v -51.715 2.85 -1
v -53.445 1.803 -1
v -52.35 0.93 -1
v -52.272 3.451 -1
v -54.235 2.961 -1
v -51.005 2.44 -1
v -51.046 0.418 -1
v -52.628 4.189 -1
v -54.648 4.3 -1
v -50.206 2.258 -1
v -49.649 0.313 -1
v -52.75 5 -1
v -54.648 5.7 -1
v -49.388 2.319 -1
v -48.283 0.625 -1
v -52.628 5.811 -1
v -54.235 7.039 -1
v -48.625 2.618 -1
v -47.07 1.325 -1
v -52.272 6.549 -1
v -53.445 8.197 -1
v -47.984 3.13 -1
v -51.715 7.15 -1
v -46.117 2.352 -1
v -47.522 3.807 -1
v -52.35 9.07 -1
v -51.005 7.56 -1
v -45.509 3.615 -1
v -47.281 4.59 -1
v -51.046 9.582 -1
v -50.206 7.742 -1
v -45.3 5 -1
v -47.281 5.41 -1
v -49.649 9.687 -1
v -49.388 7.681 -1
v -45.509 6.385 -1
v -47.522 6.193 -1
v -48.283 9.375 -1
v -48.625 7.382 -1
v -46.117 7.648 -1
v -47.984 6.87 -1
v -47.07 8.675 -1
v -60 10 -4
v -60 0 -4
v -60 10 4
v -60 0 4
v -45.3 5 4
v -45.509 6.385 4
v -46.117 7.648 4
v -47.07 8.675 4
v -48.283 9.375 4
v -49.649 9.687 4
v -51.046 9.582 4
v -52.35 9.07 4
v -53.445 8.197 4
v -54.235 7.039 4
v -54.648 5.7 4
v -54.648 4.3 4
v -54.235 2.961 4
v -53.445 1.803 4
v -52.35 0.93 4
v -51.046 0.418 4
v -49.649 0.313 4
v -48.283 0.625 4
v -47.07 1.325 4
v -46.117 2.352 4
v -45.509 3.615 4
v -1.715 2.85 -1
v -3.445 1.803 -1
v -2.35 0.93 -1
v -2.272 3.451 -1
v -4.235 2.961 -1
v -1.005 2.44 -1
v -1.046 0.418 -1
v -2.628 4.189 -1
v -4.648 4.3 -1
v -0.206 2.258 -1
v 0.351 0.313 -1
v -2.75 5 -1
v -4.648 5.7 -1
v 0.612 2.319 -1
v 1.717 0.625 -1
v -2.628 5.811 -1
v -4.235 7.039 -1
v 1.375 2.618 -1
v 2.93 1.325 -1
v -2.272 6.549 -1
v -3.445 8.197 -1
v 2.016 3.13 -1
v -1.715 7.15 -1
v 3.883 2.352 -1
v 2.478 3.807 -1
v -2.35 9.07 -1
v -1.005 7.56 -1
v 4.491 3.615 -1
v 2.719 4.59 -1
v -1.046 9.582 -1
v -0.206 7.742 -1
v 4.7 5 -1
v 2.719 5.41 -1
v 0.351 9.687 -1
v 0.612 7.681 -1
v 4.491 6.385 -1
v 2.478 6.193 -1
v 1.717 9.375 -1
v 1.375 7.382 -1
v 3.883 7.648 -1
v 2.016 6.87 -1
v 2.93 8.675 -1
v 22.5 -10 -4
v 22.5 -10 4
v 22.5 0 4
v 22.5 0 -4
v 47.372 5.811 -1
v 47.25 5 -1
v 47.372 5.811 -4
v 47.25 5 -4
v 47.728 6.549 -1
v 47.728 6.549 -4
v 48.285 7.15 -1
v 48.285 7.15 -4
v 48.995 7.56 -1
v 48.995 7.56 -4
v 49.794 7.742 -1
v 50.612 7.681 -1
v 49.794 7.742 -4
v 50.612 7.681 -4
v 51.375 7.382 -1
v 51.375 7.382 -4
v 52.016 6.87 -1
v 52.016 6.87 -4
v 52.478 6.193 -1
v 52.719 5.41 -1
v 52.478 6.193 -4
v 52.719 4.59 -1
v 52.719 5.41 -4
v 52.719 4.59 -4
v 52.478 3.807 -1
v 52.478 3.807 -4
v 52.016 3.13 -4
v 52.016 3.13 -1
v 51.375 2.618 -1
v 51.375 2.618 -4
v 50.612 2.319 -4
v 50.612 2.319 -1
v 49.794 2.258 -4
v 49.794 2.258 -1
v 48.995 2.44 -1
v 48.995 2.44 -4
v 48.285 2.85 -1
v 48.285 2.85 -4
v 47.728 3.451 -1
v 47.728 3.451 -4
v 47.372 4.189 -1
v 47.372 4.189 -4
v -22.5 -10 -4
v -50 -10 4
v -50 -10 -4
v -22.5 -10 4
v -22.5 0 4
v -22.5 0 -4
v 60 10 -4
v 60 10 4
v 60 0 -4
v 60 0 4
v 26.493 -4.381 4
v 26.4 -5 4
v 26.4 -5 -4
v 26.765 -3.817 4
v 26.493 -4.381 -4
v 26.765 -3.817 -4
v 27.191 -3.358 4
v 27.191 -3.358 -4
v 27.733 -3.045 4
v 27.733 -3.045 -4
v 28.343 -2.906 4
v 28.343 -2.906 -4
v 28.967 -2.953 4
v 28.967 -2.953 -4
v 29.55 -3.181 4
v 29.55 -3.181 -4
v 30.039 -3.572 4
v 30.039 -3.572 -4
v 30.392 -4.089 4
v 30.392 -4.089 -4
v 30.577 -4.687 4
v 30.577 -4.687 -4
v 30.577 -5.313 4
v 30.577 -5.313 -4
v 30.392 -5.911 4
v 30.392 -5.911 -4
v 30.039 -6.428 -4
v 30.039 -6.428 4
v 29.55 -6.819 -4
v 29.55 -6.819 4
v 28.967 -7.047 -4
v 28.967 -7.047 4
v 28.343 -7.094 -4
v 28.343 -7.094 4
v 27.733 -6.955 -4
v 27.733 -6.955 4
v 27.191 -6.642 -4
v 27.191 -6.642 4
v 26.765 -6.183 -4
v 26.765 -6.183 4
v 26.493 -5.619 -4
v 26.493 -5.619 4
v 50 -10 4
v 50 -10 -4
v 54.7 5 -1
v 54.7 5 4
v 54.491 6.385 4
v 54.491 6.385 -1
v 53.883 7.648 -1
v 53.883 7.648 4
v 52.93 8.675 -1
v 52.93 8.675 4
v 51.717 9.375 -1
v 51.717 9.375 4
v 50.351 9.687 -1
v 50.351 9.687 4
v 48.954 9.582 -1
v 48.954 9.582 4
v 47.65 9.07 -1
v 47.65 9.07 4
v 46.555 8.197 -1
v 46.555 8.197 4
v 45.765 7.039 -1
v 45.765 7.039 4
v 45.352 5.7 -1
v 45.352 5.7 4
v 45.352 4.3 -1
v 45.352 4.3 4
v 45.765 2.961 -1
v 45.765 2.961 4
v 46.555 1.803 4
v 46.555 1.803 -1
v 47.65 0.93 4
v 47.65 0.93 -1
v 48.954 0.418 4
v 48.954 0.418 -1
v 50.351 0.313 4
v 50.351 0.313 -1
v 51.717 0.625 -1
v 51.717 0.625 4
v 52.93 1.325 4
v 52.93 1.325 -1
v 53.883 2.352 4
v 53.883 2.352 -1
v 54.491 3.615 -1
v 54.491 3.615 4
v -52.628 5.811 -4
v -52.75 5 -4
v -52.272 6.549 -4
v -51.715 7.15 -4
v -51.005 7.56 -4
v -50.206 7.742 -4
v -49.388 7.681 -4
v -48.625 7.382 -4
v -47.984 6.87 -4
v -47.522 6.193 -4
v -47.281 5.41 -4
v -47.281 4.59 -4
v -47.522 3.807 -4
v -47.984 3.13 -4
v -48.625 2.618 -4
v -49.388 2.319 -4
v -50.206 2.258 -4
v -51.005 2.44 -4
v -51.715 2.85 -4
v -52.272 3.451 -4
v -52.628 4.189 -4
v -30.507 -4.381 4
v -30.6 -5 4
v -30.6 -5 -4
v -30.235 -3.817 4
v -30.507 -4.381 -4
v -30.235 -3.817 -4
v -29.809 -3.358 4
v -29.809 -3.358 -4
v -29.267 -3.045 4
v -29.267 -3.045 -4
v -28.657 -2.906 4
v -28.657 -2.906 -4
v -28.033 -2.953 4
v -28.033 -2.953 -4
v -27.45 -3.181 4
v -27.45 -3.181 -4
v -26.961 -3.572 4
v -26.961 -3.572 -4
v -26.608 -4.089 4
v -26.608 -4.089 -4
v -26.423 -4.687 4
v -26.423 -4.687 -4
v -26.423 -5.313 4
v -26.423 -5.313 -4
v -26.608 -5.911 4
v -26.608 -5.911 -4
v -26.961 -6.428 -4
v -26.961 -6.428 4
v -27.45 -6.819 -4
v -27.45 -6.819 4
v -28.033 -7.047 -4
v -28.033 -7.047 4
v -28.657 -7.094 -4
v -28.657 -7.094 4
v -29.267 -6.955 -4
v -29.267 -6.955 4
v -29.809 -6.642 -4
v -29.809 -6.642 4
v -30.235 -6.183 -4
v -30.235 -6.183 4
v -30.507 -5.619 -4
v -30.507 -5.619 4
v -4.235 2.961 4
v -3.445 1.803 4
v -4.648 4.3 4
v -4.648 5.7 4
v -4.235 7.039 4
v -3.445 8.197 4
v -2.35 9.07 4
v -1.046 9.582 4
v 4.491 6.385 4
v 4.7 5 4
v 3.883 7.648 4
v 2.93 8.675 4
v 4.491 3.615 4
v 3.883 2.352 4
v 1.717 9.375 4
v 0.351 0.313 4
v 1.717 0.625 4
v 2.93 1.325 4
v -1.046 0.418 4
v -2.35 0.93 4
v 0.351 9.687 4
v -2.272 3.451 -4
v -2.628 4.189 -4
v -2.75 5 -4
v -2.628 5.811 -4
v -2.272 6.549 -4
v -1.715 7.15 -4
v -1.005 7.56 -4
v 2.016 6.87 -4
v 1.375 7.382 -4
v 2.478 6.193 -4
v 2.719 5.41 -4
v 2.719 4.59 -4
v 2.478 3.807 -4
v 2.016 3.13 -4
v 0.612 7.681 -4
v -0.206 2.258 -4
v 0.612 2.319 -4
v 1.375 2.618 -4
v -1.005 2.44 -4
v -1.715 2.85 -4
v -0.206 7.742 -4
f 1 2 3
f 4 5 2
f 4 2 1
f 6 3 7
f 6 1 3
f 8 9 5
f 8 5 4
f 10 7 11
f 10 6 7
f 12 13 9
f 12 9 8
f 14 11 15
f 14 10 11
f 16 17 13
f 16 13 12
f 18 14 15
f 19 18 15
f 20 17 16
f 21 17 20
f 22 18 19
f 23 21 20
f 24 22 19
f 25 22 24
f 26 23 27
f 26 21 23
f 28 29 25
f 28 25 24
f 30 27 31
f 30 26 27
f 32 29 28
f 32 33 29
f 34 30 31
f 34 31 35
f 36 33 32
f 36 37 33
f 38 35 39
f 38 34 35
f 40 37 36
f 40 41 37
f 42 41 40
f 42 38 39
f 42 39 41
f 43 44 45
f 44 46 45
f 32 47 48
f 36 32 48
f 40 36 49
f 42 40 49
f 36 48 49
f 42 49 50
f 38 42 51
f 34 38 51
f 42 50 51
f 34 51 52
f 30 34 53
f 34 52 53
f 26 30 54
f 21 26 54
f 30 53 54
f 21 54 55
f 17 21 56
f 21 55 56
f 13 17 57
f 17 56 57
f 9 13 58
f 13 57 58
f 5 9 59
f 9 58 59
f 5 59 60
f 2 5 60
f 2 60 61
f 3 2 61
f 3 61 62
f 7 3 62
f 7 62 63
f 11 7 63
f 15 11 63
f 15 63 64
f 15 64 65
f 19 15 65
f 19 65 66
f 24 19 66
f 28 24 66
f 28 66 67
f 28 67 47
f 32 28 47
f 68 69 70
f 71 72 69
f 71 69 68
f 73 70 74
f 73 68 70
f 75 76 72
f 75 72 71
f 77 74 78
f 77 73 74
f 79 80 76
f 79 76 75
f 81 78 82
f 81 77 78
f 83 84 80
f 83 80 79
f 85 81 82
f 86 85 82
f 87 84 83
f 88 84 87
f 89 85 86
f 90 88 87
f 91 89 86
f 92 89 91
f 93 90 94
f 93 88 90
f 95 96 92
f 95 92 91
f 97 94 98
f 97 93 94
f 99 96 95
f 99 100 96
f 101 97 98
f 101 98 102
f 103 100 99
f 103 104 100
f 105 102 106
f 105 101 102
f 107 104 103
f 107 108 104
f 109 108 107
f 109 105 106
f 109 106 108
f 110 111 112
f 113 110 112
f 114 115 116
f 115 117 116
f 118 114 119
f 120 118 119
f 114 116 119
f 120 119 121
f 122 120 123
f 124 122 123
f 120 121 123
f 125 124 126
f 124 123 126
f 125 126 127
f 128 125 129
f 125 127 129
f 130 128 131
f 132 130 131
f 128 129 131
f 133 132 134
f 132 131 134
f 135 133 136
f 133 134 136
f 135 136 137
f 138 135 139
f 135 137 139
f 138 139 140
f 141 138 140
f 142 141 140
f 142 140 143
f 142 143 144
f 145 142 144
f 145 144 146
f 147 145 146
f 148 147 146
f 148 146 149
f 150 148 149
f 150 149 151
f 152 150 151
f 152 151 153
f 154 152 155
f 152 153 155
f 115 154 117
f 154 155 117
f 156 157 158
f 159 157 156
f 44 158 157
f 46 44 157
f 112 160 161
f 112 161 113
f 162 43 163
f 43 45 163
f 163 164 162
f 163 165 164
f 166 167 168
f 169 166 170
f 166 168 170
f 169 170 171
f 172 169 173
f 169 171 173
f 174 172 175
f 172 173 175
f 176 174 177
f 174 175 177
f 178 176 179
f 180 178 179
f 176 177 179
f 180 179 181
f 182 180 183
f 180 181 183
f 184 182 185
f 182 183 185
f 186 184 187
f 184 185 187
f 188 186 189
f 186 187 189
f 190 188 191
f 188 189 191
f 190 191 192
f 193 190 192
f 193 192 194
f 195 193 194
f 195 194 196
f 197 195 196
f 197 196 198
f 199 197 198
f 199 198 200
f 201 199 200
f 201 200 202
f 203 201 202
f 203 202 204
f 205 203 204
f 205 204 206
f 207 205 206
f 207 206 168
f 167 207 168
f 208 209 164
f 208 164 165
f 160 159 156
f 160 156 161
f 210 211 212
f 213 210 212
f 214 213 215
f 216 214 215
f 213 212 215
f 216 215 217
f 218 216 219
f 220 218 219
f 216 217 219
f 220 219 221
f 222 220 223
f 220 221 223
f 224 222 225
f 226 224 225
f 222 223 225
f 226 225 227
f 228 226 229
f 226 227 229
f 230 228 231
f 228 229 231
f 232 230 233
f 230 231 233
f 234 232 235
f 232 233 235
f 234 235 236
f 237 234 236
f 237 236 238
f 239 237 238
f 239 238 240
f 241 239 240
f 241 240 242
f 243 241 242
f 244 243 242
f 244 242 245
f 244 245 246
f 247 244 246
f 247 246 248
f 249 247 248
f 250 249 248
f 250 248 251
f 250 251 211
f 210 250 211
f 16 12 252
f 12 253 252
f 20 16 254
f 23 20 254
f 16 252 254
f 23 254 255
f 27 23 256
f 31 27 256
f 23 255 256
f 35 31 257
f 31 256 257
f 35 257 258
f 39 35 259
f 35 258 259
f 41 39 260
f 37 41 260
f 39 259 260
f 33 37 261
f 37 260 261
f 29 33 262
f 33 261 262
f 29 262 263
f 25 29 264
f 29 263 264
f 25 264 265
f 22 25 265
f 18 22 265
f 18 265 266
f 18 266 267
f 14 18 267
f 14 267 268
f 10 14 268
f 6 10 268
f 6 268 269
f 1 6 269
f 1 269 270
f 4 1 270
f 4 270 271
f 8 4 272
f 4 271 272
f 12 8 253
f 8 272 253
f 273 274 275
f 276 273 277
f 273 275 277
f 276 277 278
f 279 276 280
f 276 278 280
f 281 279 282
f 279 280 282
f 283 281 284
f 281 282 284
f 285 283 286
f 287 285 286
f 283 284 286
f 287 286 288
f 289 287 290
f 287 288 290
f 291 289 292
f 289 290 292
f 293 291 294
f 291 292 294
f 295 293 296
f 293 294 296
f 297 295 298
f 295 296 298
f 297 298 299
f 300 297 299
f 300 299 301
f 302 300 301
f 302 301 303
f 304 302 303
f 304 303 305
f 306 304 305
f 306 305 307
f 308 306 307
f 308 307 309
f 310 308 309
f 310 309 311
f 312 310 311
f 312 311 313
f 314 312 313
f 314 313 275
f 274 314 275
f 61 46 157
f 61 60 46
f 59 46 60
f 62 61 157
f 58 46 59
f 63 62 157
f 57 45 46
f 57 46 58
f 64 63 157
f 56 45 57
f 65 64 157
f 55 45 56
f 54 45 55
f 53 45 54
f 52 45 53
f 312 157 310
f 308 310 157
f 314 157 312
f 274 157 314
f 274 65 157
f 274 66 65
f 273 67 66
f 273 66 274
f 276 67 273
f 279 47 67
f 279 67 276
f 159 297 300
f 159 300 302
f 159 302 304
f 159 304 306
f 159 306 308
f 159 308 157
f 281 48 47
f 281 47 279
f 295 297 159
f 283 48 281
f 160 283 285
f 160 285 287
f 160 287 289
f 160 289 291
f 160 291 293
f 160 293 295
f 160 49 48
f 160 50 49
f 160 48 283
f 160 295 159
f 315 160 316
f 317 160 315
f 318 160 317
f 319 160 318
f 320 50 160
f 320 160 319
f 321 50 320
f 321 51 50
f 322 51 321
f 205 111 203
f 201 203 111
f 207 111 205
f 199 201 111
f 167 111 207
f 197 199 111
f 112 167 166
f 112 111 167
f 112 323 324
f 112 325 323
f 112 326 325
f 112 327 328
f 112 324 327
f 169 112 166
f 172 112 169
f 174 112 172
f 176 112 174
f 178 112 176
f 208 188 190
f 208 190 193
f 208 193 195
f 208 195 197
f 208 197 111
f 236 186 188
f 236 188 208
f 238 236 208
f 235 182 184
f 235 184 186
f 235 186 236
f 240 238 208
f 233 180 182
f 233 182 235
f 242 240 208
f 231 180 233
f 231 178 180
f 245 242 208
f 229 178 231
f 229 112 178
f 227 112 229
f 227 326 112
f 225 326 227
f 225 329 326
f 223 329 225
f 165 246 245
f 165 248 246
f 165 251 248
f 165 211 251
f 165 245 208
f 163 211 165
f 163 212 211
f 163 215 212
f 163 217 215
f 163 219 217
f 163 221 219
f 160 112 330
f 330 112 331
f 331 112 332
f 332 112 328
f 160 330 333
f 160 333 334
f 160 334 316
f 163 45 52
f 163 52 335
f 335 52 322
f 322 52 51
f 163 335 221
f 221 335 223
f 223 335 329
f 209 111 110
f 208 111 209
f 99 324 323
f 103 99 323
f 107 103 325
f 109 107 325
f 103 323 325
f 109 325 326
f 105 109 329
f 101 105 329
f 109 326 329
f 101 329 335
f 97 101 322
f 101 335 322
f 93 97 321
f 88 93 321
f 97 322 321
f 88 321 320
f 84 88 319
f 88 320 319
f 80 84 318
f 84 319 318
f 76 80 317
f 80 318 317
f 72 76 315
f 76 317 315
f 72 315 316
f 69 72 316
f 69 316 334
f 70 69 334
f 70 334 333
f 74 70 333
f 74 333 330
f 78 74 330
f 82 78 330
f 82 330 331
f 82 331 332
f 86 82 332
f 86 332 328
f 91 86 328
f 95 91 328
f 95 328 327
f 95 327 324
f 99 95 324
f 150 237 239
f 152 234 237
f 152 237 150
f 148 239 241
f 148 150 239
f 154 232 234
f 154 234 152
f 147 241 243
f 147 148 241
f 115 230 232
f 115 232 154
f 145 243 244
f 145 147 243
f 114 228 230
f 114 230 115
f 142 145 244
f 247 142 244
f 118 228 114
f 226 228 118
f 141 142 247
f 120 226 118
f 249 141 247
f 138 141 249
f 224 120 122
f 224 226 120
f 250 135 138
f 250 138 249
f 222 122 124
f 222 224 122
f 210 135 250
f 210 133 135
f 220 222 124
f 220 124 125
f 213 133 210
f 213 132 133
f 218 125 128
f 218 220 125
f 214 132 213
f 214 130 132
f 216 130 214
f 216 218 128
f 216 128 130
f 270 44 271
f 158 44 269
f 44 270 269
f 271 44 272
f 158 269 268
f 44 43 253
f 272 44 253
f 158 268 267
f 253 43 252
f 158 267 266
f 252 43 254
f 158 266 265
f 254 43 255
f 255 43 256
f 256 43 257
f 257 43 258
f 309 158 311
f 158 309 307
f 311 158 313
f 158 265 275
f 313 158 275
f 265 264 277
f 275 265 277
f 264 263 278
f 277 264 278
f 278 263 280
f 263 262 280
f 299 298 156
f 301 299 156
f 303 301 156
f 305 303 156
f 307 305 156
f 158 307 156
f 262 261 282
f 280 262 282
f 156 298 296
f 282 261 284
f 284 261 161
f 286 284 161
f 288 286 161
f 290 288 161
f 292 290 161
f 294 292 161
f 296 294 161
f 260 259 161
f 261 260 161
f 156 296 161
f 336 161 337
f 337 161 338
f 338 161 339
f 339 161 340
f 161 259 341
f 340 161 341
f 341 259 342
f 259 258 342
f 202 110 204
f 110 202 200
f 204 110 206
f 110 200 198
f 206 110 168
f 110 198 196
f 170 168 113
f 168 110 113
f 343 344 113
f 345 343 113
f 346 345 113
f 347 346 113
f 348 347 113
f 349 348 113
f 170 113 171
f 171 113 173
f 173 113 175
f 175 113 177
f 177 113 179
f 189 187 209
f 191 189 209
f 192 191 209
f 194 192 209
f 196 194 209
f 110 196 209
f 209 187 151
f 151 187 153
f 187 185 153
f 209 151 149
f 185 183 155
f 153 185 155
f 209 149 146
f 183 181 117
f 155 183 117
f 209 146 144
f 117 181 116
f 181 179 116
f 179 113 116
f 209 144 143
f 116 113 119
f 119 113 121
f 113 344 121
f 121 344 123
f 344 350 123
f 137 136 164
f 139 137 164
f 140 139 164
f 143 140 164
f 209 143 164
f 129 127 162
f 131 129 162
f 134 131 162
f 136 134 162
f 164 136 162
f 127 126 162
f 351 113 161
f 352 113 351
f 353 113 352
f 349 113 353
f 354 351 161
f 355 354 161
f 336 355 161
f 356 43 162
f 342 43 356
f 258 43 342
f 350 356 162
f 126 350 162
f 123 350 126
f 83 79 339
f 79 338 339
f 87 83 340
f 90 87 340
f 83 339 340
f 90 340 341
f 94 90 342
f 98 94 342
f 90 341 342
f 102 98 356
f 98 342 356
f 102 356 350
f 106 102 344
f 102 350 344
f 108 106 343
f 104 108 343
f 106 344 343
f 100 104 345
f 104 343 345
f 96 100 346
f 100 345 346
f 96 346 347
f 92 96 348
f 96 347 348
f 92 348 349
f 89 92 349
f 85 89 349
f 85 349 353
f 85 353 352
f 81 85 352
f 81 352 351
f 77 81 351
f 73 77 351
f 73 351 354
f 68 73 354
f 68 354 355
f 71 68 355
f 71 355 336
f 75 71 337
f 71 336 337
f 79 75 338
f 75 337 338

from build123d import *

# Parameters (mm, degrees)
SKETCH_1_W                = 120
SKETCH_1_H                = 20
EXTRUDE_1_DEPTH           = 4
HOLE_WIZARD_1_D           = 5.5
HOLE_WIZARD_1_CBORE_D     = 9.4
HOLE_WIZARD_1_CBORE_DEPTH = 5
HOLE_WIZARD_M5_2_D        = 4.2
SKETCH_6_W                = 45
SKETCH_6_H                = 10
CUT_EXTRUDE_1_DEPTH       = 62.351446601
CHAMFER_1_SIZE            = 10


with BuildPart() as part:
    # 草图1 → 凸台-拉伸1 (new, symmetric)
    with BuildSketch(Plane.XY):
        Rectangle(SKETCH_1_W, SKETCH_1_H)
    extrude(amount=EXTRUDE_1_DEPTH, both=True)

    # 打孔尺寸根据内六角圆柱头螺钉的类型1 (through all)
    with Locations(Plane(origin=(-5.332284739, -2.419582529, 4), x_dir=(1, 0, 0), z_dir=(0, 0, 1))):
        with Locations((-44.667715261, 7.419582529), (55.332284739, 7.419582529), (5.332284739, 7.419582529)):
            CounterBoreHole(HOLE_WIZARD_1_D / 2, HOLE_WIZARD_1_CBORE_D / 2, HOLE_WIZARD_1_CBORE_DEPTH)

    # M5 螺纹孔2 (through all)
    with Locations(Plane.XY.offset(4)):
        with Locations((-28.5, -5), (28.5, -5)):
            Hole(HOLE_WIZARD_M5_2_D / 2)

    # 草图6 → 切除-拉伸1 (cut, through all)
    with BuildSketch(Plane.XY.offset(4)):
        with Locations((0, -5)):
            Rectangle(SKETCH_6_W, SKETCH_6_H)
    extrude(amount=-CUT_EXTRUDE_1_DEPTH, mode=Mode.SUBTRACT)

    # 倒角1
    chamfer_1_edges = [part.edges().sort_by_distance(p)[0] for p in [
        (60, -10, 0),
        (-60, -10, 0),
    ]]
    chamfer(chamfer_1_edges, length=CHAMFER_1_SIZE)


solid = part.part
